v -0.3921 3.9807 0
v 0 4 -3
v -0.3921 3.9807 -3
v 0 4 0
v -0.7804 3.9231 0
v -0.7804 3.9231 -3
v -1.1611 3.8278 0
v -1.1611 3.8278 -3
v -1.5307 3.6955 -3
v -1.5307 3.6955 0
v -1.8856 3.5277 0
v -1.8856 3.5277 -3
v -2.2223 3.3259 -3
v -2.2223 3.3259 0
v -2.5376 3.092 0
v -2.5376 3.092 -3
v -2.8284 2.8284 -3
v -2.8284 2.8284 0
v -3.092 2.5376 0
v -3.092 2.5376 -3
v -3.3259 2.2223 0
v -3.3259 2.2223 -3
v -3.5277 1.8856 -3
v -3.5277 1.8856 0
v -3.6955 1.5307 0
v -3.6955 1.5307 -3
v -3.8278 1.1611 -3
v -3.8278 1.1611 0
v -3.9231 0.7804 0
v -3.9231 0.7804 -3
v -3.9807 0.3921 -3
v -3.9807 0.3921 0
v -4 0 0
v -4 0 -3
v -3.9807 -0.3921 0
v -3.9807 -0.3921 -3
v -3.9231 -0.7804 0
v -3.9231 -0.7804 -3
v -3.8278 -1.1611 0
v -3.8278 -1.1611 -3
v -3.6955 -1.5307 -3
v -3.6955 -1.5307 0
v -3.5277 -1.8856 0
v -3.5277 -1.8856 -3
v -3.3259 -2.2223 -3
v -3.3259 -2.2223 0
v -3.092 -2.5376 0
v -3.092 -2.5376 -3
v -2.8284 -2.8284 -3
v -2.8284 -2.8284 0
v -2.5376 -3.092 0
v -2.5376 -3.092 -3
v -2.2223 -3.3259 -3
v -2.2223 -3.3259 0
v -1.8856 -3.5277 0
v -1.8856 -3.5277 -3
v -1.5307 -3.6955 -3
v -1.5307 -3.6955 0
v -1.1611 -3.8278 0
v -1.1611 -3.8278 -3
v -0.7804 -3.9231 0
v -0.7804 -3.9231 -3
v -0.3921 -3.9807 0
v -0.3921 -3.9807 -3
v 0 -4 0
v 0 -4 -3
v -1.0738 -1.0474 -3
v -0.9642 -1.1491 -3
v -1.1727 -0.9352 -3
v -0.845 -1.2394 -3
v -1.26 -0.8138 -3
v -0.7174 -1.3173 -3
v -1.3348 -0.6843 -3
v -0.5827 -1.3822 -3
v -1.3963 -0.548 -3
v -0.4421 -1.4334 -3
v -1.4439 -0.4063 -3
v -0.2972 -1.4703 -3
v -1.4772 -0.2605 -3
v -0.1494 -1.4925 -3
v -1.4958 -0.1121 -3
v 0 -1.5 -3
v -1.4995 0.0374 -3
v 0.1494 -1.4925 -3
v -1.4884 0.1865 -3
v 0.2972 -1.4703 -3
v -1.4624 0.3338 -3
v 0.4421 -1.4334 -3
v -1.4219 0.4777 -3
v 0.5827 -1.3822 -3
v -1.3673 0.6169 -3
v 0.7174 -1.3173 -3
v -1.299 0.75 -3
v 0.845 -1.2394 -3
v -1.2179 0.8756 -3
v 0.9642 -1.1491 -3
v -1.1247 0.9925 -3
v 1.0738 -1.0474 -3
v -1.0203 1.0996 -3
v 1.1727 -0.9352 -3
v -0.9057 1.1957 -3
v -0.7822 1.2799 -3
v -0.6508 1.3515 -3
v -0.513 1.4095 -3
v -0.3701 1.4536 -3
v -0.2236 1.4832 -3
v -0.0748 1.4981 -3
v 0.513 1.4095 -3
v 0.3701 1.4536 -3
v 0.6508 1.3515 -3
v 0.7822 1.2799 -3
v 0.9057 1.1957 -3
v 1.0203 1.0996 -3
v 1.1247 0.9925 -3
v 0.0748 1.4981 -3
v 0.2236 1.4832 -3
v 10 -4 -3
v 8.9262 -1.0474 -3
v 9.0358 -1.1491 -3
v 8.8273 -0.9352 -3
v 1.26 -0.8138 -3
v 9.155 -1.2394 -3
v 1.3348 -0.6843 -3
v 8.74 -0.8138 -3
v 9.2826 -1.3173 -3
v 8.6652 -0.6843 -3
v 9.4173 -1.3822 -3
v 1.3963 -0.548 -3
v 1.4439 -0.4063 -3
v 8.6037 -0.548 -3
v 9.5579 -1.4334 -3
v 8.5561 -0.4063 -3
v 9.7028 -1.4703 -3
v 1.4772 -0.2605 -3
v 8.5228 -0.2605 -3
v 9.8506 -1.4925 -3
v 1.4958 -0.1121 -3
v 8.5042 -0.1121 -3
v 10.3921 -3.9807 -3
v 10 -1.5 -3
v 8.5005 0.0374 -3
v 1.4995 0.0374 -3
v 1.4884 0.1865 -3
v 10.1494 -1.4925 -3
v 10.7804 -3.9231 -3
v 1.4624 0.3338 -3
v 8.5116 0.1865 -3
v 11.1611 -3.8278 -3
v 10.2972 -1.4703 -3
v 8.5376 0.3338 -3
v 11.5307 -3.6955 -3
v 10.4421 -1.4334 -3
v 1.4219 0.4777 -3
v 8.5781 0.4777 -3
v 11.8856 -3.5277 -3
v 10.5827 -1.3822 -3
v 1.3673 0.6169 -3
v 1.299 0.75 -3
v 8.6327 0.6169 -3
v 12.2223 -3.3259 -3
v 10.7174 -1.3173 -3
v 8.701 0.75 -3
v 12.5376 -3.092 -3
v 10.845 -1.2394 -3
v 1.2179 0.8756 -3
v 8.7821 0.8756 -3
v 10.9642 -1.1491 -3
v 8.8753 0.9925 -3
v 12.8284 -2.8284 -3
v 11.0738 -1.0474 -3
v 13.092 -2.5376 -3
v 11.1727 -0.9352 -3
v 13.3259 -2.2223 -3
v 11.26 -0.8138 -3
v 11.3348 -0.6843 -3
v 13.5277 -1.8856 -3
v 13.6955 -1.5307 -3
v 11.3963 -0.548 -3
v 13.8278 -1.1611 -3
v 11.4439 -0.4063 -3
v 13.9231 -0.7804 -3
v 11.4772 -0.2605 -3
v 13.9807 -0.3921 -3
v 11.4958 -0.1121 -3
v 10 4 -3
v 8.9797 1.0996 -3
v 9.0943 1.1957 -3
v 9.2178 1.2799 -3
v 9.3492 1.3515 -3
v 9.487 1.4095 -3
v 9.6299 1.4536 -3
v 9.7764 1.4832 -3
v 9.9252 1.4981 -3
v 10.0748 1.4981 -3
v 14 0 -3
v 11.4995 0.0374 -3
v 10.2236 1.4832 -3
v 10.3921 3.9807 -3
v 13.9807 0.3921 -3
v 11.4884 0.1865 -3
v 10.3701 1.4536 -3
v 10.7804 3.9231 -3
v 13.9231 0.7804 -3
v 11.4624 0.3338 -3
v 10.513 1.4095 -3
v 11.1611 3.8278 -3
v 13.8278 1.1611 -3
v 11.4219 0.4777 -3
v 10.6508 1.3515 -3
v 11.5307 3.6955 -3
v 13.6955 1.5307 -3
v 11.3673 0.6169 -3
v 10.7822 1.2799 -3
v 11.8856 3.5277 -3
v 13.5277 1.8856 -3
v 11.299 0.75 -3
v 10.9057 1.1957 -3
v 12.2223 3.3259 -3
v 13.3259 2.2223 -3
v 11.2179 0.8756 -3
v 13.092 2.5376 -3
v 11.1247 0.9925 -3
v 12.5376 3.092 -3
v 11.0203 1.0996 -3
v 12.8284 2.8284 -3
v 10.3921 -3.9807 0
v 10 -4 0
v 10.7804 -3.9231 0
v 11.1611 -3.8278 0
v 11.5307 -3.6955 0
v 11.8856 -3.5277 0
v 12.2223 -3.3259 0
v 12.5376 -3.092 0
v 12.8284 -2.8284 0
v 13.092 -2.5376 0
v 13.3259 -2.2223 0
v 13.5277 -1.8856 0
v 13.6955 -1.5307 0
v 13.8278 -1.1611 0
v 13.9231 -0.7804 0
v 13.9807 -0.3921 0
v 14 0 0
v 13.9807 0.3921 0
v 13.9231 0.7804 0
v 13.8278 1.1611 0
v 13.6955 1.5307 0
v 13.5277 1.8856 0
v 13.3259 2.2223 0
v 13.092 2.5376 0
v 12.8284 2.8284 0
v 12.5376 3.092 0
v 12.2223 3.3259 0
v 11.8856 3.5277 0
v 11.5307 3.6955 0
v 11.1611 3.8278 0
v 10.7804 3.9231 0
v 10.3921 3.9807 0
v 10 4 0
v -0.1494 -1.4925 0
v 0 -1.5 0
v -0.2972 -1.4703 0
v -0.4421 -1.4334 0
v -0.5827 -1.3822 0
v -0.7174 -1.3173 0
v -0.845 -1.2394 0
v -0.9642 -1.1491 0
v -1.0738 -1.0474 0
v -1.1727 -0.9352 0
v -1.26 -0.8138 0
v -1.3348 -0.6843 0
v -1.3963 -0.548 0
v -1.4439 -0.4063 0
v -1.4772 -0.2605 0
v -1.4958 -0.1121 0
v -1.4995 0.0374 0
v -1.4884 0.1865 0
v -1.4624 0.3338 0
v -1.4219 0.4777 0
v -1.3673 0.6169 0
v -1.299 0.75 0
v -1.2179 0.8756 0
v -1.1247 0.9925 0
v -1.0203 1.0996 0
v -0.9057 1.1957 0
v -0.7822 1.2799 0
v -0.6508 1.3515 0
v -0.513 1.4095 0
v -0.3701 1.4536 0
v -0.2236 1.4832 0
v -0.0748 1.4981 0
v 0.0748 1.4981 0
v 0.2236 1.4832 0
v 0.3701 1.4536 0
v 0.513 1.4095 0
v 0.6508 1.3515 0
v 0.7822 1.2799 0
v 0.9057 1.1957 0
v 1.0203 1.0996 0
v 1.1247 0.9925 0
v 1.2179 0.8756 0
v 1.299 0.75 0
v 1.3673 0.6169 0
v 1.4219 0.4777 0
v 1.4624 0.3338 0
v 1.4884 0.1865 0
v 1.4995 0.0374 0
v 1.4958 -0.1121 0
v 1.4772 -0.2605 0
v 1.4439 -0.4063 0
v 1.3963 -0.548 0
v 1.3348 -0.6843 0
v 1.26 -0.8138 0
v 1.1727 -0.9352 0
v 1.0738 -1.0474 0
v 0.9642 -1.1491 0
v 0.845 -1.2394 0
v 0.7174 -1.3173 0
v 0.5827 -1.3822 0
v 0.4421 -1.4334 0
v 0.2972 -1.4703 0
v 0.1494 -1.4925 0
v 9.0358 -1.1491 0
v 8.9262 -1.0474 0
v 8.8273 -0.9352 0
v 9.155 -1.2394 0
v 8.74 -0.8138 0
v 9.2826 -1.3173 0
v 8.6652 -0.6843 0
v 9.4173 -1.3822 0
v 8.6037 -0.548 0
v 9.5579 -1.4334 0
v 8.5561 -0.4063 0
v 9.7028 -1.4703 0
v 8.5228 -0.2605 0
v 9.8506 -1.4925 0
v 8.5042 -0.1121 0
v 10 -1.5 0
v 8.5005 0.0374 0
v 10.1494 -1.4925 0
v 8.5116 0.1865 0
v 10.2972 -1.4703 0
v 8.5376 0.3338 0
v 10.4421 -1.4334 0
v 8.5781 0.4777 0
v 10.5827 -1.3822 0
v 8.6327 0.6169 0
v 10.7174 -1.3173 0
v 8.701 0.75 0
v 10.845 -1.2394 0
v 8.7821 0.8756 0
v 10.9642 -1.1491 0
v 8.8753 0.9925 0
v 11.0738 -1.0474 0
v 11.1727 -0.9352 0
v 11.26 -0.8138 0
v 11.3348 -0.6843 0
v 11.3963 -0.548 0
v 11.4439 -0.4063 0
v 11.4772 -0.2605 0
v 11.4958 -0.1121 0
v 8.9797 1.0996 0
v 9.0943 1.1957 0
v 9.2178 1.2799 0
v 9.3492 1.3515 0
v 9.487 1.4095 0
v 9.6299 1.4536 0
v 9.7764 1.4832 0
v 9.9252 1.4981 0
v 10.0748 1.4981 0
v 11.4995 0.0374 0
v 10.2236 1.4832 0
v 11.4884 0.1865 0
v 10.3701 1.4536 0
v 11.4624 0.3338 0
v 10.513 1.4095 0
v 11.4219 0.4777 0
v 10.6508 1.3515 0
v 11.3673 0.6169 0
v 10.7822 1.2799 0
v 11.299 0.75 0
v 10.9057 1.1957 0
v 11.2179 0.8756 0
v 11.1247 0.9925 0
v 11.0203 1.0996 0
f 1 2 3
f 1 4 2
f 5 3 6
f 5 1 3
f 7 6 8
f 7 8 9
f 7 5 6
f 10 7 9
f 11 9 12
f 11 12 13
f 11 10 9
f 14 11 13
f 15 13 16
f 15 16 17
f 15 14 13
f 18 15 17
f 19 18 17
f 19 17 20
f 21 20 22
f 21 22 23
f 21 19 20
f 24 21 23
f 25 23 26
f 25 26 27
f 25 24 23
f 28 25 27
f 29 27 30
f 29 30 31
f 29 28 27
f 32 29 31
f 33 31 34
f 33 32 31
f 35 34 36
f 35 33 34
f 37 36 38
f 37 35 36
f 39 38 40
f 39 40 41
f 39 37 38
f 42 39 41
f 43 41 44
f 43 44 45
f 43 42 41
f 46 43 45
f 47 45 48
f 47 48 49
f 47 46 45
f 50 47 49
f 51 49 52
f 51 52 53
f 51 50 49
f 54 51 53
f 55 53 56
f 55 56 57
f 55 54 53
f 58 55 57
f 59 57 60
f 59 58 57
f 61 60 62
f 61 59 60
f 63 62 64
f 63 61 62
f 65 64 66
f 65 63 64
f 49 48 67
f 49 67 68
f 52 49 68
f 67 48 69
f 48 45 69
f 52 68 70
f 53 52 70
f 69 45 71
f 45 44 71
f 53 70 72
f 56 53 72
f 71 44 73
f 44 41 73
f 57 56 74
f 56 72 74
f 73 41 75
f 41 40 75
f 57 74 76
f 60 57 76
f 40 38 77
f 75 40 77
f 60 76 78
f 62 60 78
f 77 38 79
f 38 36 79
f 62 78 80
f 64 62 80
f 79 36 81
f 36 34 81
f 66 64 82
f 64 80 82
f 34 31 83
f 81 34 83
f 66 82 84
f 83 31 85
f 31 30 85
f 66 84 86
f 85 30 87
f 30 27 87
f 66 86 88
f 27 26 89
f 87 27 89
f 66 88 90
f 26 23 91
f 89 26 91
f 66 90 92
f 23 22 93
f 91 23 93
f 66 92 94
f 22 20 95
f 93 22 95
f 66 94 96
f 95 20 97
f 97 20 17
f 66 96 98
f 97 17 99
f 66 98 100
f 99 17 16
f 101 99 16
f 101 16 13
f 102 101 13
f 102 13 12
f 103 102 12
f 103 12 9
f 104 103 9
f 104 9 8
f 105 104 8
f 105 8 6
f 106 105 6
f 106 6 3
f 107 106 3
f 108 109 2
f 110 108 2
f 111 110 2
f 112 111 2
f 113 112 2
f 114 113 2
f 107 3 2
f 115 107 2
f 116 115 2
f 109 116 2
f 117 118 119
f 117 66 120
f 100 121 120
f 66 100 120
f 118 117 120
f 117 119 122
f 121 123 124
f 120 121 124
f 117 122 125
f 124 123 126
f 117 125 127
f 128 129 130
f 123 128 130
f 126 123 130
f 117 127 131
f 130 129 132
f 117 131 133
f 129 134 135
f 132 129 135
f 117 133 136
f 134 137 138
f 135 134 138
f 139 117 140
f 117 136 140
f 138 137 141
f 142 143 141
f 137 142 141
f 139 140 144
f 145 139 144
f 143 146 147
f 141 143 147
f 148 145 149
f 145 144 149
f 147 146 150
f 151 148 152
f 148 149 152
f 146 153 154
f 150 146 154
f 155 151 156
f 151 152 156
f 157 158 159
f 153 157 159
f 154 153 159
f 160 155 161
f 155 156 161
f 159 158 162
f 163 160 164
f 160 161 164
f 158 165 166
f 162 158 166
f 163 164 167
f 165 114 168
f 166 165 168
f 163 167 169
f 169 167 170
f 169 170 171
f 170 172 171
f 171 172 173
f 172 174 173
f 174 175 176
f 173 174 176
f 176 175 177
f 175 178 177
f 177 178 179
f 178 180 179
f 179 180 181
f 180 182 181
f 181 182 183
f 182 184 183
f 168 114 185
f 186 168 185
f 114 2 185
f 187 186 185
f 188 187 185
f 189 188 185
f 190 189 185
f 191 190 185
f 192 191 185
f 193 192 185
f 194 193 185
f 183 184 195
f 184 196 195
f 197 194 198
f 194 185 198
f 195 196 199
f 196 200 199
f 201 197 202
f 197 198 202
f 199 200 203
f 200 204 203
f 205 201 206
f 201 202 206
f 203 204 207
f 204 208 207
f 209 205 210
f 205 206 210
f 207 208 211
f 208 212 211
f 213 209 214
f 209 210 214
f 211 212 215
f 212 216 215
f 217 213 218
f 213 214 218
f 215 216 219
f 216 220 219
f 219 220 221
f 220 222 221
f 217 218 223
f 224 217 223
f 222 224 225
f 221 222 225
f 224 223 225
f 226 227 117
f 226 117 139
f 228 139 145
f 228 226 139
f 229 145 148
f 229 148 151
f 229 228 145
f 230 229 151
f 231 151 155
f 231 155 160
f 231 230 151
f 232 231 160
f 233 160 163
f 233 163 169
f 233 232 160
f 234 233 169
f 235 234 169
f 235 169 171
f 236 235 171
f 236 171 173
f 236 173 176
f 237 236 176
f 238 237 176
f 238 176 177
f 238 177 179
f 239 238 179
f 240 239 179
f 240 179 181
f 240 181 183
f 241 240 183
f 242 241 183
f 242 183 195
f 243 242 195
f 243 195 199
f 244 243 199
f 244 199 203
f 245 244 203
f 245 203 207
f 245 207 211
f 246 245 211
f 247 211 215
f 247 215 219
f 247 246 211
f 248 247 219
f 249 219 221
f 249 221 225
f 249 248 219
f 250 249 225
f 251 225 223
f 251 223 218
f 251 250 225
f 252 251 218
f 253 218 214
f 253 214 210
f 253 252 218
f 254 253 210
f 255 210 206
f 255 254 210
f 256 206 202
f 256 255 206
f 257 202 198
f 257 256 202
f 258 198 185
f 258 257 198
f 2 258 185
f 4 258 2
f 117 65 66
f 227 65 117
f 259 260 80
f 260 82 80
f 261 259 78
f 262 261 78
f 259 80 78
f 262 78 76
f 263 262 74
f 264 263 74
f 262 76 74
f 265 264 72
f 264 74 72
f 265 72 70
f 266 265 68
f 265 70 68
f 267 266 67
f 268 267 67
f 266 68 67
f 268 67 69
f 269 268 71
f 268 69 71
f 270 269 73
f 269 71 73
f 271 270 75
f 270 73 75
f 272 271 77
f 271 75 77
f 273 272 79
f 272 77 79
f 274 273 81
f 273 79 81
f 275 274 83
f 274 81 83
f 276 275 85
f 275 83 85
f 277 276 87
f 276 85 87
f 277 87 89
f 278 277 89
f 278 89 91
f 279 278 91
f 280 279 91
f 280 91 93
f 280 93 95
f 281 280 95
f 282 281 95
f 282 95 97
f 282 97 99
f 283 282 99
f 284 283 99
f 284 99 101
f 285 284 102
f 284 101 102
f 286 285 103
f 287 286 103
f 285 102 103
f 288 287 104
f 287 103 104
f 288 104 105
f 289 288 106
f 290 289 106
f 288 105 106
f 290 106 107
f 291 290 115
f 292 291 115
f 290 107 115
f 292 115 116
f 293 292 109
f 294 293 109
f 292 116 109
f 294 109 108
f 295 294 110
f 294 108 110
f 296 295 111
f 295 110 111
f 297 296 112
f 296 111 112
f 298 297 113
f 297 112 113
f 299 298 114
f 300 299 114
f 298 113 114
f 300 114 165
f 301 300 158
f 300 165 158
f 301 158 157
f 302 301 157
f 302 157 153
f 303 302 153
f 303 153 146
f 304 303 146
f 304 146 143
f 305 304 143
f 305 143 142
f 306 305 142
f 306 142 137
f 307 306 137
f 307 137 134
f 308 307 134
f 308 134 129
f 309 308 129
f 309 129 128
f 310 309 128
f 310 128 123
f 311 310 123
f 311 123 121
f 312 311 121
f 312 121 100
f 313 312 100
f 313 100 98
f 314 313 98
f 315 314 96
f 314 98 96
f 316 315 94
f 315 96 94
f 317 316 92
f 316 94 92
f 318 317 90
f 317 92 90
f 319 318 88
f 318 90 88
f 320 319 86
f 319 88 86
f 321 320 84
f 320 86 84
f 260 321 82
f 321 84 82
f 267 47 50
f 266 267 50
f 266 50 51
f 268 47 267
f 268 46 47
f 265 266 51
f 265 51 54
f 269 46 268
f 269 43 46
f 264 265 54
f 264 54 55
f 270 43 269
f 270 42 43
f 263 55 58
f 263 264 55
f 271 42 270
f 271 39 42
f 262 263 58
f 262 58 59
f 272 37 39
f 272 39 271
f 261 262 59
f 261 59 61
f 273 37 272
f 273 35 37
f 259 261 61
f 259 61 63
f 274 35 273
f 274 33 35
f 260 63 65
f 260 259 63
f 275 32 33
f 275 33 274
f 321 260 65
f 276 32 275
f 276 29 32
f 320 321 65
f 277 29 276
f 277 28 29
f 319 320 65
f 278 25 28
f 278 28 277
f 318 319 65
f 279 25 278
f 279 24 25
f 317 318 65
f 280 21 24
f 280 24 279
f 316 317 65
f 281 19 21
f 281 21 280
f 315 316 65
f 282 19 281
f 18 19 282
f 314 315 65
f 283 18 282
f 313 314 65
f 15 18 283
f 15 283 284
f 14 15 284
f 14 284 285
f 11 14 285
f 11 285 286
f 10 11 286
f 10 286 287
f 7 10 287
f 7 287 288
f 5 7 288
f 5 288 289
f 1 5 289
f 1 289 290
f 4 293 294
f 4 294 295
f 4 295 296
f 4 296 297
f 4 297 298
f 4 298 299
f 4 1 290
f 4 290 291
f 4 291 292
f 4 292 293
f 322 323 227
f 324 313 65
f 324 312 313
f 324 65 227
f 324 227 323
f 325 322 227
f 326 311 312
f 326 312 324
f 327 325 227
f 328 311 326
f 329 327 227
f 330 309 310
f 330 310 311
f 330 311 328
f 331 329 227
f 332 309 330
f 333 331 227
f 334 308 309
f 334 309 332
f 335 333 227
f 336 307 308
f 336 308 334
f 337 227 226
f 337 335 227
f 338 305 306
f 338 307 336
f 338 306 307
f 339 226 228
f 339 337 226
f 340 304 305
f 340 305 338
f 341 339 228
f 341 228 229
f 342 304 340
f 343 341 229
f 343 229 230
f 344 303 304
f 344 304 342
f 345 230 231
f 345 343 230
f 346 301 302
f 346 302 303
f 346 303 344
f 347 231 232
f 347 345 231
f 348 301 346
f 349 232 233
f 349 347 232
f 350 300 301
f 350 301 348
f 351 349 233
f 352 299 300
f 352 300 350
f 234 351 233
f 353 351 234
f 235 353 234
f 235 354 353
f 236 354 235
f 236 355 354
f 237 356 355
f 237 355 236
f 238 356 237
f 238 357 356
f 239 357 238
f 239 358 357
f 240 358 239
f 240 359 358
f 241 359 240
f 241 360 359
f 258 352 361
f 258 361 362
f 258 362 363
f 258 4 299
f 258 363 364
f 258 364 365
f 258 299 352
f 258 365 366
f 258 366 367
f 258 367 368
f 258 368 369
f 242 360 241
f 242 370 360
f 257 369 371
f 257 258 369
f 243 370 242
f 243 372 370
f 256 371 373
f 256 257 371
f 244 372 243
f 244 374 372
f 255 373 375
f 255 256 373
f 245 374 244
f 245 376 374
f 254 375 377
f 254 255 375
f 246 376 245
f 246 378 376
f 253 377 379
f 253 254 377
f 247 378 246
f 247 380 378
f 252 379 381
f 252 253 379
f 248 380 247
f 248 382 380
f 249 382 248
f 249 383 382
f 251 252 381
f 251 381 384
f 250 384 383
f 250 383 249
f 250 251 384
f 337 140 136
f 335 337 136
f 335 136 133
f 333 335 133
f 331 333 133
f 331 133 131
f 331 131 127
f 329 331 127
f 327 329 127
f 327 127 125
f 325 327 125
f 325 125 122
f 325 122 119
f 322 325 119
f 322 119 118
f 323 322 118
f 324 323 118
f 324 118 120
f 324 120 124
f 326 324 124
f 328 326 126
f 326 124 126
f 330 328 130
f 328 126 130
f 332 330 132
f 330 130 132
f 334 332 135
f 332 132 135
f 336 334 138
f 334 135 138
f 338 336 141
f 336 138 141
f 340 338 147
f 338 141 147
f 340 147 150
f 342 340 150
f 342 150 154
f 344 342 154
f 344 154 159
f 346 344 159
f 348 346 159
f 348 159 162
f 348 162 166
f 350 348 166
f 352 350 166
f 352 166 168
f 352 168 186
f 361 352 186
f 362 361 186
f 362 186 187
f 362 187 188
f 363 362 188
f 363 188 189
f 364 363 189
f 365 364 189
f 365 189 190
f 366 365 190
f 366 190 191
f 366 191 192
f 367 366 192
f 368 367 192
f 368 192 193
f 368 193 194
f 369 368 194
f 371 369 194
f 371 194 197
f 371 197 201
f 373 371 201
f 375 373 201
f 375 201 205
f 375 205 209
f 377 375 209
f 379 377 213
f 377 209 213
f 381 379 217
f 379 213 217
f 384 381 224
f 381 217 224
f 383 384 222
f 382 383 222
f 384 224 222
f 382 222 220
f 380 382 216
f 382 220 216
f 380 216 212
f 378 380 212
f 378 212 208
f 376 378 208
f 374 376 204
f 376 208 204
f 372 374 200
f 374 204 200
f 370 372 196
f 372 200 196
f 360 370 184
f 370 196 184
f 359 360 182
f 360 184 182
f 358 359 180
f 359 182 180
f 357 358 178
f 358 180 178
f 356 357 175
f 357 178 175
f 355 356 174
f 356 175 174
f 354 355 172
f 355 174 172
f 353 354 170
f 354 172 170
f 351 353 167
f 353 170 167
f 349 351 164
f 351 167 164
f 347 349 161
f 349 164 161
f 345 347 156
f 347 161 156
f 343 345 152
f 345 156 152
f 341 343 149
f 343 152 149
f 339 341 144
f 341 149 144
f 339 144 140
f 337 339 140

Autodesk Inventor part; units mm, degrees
ref_plane "YZ Plane" through (0, 0, 0) normal (1, 0, 0) x (0, 1, 0)
ref_plane "XZ Plane" through (0, 0, 0) normal (0, 1, 0) x (-1, 0, 0)
ref_plane "XY Plane" through (0, 0, 0) normal (0, 0, 1) x (1, 0, 0)
sketch "Sketch1" plane through (0, 0, 0) normal (0, 0, 1) x (1, 0, 0)
  line L0 (0, 0) -> (10, 0) construction
  line L1 (0, -4) -> (10, -4)
  line L2 (10, 4) -> (0, 4)
  arc A0 (0, 4) -> (0, -4) centre (0, 0) ccw
  arc A1 (10, -4) -> (10, 4) centre (10, 0) ccw
  point P0 (5, 0)
  dimension "d0" = 10
  dimension "d1" = 4
extrude "Extrusion1" add sketch "Sketch1" against normal blind 3
hole "Hole1" at (0, 0, 0) at (10, 0, 0) direction (0, 0, -1) diameter 3 depth 8 tip angle 118
properties part number "Updown_link"
